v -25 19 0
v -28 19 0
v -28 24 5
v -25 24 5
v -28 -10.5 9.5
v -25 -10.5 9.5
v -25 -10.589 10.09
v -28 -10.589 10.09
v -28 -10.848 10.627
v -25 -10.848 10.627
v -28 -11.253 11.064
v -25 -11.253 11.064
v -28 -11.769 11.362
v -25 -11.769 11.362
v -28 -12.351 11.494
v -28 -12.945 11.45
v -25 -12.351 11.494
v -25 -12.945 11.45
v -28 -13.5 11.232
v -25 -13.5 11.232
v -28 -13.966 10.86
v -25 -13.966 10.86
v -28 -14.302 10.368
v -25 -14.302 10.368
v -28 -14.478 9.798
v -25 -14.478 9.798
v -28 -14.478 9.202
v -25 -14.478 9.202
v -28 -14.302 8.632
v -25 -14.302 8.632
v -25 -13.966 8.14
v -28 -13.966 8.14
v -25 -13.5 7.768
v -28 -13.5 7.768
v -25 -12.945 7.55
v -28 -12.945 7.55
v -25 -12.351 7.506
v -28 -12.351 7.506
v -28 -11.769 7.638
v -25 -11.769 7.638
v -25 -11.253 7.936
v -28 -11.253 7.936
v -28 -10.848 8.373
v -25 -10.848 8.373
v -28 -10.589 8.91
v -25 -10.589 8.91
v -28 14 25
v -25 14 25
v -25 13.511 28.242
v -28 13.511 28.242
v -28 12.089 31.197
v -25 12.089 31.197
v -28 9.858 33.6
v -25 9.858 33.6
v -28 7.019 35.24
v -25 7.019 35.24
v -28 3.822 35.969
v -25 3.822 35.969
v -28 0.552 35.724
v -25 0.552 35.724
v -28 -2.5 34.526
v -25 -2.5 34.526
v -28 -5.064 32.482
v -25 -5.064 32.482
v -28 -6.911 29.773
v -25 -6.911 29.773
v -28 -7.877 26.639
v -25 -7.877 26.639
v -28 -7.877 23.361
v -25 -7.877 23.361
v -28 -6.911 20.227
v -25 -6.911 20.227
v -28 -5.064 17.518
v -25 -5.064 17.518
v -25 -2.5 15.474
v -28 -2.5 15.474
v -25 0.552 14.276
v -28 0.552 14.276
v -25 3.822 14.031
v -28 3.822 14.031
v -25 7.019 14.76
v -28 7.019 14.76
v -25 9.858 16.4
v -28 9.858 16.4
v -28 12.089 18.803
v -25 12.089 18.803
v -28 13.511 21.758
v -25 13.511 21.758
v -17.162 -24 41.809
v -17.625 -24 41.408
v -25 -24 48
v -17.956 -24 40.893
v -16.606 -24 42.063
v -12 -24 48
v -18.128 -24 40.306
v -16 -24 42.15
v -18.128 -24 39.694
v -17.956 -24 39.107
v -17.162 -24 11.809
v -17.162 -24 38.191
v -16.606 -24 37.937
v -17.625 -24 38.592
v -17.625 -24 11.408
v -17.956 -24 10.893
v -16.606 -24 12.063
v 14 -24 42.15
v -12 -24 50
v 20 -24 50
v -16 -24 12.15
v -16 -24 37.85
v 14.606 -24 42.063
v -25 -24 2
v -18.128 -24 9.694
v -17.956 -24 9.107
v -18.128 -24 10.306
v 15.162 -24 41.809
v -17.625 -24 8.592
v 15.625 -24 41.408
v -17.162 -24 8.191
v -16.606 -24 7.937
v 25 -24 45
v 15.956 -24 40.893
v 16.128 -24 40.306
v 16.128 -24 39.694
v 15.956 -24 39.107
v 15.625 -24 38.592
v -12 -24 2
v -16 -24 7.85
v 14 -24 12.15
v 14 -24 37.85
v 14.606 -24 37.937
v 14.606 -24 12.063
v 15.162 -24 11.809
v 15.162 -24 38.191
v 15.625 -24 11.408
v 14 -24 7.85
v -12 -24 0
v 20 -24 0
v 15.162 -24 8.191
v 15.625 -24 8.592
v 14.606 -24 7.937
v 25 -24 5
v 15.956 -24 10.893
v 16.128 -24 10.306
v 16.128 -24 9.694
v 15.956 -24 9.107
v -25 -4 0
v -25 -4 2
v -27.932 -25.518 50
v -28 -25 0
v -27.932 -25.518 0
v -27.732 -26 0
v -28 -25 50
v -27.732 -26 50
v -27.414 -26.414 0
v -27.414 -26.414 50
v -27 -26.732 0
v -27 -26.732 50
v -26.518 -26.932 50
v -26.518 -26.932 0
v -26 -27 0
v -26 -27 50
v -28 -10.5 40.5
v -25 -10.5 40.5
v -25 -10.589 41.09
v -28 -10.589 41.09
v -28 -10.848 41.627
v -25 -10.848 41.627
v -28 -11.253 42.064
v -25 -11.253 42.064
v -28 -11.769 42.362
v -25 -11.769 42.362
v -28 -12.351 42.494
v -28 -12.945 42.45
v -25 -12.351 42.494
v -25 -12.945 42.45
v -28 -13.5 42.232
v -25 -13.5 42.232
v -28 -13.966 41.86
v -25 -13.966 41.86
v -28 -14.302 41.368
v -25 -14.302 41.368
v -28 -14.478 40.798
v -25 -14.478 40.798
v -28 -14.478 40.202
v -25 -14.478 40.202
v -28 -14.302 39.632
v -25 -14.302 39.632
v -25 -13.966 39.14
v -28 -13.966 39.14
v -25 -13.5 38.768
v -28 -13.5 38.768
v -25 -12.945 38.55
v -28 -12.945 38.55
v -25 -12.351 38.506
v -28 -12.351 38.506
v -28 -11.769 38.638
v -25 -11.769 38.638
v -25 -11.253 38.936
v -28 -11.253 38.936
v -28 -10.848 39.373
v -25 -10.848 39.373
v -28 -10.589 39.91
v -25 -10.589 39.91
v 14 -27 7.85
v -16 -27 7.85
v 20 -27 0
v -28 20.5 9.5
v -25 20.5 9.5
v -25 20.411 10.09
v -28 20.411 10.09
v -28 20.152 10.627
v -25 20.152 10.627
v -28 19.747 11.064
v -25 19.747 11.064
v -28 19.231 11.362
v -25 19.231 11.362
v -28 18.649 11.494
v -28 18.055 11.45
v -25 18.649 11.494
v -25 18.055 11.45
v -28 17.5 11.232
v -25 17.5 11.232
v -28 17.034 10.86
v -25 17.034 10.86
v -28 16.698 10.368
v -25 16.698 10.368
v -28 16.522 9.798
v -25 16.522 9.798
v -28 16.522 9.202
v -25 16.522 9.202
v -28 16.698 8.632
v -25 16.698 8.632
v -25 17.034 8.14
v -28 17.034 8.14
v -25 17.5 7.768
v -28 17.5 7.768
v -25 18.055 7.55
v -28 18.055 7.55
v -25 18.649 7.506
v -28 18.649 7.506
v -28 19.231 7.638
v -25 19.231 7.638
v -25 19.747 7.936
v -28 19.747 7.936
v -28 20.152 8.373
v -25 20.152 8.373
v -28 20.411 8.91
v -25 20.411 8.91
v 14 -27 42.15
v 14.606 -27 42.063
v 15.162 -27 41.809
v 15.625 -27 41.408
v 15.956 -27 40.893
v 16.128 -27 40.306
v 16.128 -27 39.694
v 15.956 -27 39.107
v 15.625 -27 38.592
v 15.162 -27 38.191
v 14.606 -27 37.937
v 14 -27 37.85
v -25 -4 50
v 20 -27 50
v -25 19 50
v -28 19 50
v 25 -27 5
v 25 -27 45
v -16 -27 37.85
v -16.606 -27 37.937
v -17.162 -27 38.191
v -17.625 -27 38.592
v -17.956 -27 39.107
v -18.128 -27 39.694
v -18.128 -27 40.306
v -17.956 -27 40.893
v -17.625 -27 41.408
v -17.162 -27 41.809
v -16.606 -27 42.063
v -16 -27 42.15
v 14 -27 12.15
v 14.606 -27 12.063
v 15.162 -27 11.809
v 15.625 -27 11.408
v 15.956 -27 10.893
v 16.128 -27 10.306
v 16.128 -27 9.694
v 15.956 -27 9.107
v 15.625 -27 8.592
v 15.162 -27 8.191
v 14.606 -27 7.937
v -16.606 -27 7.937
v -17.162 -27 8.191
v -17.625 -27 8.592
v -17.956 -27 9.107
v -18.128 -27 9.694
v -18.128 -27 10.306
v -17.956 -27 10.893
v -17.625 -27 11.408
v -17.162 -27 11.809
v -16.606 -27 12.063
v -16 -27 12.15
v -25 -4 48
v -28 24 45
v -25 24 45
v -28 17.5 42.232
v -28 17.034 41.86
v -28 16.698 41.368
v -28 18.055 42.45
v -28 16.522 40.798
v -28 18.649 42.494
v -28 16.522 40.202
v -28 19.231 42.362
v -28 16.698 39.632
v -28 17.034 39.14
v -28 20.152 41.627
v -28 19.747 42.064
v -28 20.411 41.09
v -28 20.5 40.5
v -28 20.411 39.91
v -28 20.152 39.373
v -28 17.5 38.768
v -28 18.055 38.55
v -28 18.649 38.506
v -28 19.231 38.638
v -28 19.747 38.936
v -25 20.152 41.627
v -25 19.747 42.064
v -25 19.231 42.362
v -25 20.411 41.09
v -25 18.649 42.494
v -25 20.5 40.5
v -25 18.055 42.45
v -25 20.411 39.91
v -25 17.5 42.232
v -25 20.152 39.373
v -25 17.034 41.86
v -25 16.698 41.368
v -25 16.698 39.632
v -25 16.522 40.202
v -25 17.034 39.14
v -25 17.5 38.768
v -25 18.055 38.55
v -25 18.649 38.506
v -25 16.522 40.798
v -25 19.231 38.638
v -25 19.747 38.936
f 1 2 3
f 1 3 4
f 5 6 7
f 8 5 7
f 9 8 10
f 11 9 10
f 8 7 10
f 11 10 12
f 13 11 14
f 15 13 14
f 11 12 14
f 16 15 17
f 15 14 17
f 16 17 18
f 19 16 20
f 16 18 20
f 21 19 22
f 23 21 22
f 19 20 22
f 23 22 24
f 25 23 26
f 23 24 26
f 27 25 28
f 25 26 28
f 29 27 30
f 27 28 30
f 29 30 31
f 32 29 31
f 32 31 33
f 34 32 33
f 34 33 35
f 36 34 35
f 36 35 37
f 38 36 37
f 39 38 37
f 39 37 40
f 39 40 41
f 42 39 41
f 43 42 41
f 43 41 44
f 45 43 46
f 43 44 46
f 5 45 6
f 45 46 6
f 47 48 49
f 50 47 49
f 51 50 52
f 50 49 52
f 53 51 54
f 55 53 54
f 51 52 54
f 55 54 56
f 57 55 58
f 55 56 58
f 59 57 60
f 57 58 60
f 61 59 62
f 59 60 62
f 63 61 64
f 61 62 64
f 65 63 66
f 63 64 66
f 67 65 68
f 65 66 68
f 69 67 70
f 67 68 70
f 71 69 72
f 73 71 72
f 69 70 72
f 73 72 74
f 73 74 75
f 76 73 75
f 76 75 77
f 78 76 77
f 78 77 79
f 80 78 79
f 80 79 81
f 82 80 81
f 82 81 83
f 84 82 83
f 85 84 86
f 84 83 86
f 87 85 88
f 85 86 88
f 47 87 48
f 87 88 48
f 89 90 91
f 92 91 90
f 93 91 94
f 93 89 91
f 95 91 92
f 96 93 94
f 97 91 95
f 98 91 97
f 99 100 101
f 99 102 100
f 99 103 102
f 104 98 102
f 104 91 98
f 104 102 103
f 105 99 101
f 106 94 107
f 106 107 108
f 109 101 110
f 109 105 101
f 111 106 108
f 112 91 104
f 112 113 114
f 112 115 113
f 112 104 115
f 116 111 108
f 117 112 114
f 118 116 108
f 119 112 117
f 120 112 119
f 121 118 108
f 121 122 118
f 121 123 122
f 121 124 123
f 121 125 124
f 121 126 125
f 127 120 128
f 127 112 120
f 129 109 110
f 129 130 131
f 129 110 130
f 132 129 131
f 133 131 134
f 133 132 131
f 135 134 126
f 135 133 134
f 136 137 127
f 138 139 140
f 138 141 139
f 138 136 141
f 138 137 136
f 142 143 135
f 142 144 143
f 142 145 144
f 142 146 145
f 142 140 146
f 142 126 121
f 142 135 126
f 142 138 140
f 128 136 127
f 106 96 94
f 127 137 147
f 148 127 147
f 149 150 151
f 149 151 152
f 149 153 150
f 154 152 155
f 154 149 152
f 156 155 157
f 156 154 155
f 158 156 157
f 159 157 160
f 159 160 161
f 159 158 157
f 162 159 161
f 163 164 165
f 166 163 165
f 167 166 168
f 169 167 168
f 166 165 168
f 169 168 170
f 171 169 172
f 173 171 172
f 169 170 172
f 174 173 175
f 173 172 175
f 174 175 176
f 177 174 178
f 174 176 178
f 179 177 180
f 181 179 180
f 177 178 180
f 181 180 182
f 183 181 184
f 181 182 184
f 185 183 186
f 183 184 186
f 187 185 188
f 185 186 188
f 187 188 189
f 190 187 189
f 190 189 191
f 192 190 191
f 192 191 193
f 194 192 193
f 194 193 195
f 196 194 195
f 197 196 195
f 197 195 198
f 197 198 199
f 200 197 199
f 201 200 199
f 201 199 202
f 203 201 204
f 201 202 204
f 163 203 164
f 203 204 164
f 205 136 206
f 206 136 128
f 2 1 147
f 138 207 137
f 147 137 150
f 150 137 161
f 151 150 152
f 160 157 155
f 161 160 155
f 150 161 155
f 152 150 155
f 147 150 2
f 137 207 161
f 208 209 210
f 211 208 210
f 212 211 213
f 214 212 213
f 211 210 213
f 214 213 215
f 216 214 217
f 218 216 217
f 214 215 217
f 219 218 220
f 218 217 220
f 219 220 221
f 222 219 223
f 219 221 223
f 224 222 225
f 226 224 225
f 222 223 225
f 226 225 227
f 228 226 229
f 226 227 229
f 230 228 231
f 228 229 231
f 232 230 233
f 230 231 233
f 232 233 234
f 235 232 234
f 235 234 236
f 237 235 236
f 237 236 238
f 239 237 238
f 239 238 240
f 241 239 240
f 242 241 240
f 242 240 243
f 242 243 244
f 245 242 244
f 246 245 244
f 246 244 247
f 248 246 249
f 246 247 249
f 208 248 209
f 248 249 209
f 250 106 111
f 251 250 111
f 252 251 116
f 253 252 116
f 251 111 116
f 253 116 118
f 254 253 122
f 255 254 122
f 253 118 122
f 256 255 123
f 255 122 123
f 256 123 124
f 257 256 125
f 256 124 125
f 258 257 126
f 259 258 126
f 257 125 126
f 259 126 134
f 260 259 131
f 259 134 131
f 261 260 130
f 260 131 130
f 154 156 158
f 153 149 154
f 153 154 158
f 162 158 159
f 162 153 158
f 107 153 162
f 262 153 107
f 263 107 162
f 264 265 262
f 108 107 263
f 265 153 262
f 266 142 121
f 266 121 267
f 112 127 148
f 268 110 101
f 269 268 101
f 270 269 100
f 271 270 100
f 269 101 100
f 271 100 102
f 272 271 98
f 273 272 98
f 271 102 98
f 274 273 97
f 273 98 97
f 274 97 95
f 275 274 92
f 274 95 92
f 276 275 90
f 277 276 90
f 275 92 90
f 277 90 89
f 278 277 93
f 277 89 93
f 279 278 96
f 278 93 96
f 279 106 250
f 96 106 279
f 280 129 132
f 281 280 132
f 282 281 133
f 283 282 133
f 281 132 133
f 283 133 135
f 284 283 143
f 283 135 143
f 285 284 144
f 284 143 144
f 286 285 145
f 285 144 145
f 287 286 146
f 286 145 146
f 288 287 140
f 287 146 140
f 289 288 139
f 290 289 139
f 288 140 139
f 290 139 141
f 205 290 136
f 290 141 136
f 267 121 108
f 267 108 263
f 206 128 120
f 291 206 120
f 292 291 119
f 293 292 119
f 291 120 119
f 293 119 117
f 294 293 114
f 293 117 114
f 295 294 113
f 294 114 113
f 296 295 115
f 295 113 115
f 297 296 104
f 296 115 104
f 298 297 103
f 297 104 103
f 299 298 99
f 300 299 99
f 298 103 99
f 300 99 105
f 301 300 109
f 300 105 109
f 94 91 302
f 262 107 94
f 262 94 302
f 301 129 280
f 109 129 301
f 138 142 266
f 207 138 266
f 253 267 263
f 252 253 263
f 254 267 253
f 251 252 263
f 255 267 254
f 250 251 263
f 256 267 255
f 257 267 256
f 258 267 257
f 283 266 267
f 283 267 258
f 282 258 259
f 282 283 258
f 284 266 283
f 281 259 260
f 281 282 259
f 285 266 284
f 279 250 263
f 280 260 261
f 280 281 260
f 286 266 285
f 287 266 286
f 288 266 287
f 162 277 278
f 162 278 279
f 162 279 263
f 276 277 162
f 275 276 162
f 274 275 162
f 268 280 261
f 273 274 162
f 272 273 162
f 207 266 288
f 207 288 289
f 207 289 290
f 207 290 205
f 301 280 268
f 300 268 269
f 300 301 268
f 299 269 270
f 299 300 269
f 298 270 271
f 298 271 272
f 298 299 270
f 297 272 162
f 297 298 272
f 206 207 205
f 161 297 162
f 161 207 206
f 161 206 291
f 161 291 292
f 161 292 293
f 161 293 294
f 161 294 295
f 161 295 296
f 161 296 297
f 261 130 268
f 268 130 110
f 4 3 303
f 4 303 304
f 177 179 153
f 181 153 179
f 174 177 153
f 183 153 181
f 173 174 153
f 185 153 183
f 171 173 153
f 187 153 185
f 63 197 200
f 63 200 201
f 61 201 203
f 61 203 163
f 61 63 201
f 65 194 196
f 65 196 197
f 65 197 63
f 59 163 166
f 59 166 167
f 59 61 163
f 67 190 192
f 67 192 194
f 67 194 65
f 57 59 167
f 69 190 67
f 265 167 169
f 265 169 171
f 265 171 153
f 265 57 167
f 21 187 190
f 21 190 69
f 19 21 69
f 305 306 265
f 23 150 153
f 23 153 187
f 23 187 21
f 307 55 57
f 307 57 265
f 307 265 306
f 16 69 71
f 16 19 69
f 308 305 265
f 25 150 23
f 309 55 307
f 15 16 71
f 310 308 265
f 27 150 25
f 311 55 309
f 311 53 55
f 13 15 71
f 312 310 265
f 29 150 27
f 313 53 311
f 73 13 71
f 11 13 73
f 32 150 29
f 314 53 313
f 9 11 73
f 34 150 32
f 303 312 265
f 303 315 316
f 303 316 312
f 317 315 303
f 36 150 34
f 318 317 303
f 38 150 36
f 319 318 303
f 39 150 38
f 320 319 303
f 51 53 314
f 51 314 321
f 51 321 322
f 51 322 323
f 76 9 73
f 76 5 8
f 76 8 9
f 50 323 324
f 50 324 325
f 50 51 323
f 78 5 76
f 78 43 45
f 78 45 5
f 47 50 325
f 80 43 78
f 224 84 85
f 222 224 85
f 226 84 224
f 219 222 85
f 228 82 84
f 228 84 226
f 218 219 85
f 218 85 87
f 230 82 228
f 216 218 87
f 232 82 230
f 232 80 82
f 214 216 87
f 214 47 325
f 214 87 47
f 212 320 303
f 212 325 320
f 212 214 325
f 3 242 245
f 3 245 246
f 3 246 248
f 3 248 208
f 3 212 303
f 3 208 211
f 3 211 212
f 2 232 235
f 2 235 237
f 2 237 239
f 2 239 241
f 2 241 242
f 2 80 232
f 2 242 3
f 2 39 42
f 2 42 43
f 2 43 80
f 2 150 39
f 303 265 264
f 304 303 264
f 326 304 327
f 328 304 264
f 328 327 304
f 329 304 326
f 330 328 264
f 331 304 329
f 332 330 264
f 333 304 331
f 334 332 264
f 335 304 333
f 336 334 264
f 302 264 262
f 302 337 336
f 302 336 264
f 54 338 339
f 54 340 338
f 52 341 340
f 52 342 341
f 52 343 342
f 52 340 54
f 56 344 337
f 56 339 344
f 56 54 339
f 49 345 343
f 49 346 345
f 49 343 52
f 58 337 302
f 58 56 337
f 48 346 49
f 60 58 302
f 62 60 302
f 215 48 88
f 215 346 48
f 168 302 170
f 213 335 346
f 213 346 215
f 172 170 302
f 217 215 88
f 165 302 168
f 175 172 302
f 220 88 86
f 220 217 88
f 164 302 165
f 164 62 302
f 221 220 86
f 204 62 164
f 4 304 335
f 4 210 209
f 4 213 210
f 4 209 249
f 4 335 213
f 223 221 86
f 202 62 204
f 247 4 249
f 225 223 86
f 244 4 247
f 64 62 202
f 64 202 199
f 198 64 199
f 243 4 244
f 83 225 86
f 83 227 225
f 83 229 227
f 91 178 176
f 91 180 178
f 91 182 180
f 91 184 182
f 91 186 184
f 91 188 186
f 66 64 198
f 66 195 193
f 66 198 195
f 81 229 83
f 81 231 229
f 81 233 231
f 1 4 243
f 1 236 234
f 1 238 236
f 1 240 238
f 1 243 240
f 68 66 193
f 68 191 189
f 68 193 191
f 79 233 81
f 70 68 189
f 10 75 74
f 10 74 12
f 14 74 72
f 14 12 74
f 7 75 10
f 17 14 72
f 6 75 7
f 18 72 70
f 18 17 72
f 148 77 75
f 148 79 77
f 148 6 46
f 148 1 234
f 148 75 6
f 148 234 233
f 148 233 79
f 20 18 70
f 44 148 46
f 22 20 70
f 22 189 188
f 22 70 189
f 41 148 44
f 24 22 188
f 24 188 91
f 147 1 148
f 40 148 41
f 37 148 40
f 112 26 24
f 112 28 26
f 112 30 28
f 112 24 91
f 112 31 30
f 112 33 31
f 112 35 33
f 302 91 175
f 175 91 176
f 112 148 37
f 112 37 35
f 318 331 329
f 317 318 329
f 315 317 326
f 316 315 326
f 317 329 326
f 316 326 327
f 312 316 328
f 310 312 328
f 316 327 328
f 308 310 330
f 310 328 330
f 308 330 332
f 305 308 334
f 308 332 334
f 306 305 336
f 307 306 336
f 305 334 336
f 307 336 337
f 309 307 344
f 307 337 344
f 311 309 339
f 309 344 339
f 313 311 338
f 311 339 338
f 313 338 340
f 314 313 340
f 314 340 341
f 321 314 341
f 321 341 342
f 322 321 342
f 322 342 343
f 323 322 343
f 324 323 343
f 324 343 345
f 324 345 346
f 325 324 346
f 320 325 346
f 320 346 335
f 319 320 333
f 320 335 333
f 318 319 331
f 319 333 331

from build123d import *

# Parameters (mm, degrees)
PAD_DEPTH       = 50
SKETCH001_R     = 11
SKETCH001_R_2   = 2
POCKET_DEPTH    = 3
POCKET001_DEPTH = 3
CHAMFER_SIZE    = 5
FILLET_R        = 2
PAD001_DEPTH    = 2
PAD002_DEPTH    = 2


with BuildPart() as part:
    # Sketch → Pad (new body)
    with BuildSketch(Plane.XY):
        Polygon((-28, 24), (-25, 24), (-25, -24), (25, -24), (25, -27), (-28, -27), align=None)
    extrude(amount=PAD_DEPTH)

    # Sketch001 (on Face2 of Pad) → Pocket (cut)
    with BuildSketch(Plane.YZ.offset(-25)):
        with Locations((3, 25)):
            Circle(SKETCH001_R)
        with Locations((-12.5, 40.5)):
            Circle(SKETCH001_R_2)
        with Locations((18.5, 40.5)):
            Circle(SKETCH001_R_2)
        with Locations((-12.5, 9.5)):
            Circle(SKETCH001_R_2)
        with Locations((18.5, 9.5)):
            Circle(SKETCH001_R_2)
    extrude(amount=-POCKET_DEPTH, mode=Mode.SUBTRACT)

    # Sketch002 (on Face12 of Pocket) → Pocket001 (cut)
    with BuildSketch(Plane(origin=(0, -24, 0), x_dir=(-1, 0, 0), z_dir=(0, 1, 0))):
        with BuildLine():
            ThreePointArc((-14, 42.15), (-16.15, 40), (-14, 37.85))
            Line((-14, 37.85), (16, 37.85))
            ThreePointArc((16, 37.85), (18.15, 40), (16, 42.15))
            Line((-14, 42.15), (16, 42.15))
        make_face()
        with BuildLine():
            ThreePointArc((-14, 12.15), (-16.15, 10), (-14, 7.85))
            Line((-14, 7.85), (16, 7.85))
            ThreePointArc((16, 7.85), (18.15, 10), (16, 12.15))
            Line((-14, 12.15), (16, 12.15))
        make_face()
    extrude(amount=-POCKET001_DEPTH, mode=Mode.SUBTRACT)

    # Chamfer
    chamfer_edges = [part.edges().sort_by_distance(p)[0] for p in [
        (-26.5, 24, 0),
        (25, -25.5, 0),
        (-26.5, 24, 50),
        (25, -25.5, 50),
    ]]
    chamfer(chamfer_edges, length=CHAMFER_SIZE)

    # Fillet
    fillet_edges = [part.edges().sort_by_distance(p)[0] for p in [
        (-28, -27, 25),
    ]]
    fillet(fillet_edges, radius=FILLET_R)

    # Sketch003 (on Face5 of Fillet) → Pad001 (join)
    with BuildSketch(Plane.XY.offset(50)):
        Polygon((-25, -24), (-12, -24), (-25, -4), align=None)
    extrude(amount=-PAD001_DEPTH)

    # Sketch004 (on Face2 of Pad001) → Pad002 (join)
    with BuildSketch(Plane(origin=(0, 0, 0), x_dir=(1, 0, 0), z_dir=(0, 0, -1))):
        Polygon((-25, 24), (-12, 24), (-25, 4), align=None)
    extrude(amount=-PAD002_DEPTH)


solid = part.part
